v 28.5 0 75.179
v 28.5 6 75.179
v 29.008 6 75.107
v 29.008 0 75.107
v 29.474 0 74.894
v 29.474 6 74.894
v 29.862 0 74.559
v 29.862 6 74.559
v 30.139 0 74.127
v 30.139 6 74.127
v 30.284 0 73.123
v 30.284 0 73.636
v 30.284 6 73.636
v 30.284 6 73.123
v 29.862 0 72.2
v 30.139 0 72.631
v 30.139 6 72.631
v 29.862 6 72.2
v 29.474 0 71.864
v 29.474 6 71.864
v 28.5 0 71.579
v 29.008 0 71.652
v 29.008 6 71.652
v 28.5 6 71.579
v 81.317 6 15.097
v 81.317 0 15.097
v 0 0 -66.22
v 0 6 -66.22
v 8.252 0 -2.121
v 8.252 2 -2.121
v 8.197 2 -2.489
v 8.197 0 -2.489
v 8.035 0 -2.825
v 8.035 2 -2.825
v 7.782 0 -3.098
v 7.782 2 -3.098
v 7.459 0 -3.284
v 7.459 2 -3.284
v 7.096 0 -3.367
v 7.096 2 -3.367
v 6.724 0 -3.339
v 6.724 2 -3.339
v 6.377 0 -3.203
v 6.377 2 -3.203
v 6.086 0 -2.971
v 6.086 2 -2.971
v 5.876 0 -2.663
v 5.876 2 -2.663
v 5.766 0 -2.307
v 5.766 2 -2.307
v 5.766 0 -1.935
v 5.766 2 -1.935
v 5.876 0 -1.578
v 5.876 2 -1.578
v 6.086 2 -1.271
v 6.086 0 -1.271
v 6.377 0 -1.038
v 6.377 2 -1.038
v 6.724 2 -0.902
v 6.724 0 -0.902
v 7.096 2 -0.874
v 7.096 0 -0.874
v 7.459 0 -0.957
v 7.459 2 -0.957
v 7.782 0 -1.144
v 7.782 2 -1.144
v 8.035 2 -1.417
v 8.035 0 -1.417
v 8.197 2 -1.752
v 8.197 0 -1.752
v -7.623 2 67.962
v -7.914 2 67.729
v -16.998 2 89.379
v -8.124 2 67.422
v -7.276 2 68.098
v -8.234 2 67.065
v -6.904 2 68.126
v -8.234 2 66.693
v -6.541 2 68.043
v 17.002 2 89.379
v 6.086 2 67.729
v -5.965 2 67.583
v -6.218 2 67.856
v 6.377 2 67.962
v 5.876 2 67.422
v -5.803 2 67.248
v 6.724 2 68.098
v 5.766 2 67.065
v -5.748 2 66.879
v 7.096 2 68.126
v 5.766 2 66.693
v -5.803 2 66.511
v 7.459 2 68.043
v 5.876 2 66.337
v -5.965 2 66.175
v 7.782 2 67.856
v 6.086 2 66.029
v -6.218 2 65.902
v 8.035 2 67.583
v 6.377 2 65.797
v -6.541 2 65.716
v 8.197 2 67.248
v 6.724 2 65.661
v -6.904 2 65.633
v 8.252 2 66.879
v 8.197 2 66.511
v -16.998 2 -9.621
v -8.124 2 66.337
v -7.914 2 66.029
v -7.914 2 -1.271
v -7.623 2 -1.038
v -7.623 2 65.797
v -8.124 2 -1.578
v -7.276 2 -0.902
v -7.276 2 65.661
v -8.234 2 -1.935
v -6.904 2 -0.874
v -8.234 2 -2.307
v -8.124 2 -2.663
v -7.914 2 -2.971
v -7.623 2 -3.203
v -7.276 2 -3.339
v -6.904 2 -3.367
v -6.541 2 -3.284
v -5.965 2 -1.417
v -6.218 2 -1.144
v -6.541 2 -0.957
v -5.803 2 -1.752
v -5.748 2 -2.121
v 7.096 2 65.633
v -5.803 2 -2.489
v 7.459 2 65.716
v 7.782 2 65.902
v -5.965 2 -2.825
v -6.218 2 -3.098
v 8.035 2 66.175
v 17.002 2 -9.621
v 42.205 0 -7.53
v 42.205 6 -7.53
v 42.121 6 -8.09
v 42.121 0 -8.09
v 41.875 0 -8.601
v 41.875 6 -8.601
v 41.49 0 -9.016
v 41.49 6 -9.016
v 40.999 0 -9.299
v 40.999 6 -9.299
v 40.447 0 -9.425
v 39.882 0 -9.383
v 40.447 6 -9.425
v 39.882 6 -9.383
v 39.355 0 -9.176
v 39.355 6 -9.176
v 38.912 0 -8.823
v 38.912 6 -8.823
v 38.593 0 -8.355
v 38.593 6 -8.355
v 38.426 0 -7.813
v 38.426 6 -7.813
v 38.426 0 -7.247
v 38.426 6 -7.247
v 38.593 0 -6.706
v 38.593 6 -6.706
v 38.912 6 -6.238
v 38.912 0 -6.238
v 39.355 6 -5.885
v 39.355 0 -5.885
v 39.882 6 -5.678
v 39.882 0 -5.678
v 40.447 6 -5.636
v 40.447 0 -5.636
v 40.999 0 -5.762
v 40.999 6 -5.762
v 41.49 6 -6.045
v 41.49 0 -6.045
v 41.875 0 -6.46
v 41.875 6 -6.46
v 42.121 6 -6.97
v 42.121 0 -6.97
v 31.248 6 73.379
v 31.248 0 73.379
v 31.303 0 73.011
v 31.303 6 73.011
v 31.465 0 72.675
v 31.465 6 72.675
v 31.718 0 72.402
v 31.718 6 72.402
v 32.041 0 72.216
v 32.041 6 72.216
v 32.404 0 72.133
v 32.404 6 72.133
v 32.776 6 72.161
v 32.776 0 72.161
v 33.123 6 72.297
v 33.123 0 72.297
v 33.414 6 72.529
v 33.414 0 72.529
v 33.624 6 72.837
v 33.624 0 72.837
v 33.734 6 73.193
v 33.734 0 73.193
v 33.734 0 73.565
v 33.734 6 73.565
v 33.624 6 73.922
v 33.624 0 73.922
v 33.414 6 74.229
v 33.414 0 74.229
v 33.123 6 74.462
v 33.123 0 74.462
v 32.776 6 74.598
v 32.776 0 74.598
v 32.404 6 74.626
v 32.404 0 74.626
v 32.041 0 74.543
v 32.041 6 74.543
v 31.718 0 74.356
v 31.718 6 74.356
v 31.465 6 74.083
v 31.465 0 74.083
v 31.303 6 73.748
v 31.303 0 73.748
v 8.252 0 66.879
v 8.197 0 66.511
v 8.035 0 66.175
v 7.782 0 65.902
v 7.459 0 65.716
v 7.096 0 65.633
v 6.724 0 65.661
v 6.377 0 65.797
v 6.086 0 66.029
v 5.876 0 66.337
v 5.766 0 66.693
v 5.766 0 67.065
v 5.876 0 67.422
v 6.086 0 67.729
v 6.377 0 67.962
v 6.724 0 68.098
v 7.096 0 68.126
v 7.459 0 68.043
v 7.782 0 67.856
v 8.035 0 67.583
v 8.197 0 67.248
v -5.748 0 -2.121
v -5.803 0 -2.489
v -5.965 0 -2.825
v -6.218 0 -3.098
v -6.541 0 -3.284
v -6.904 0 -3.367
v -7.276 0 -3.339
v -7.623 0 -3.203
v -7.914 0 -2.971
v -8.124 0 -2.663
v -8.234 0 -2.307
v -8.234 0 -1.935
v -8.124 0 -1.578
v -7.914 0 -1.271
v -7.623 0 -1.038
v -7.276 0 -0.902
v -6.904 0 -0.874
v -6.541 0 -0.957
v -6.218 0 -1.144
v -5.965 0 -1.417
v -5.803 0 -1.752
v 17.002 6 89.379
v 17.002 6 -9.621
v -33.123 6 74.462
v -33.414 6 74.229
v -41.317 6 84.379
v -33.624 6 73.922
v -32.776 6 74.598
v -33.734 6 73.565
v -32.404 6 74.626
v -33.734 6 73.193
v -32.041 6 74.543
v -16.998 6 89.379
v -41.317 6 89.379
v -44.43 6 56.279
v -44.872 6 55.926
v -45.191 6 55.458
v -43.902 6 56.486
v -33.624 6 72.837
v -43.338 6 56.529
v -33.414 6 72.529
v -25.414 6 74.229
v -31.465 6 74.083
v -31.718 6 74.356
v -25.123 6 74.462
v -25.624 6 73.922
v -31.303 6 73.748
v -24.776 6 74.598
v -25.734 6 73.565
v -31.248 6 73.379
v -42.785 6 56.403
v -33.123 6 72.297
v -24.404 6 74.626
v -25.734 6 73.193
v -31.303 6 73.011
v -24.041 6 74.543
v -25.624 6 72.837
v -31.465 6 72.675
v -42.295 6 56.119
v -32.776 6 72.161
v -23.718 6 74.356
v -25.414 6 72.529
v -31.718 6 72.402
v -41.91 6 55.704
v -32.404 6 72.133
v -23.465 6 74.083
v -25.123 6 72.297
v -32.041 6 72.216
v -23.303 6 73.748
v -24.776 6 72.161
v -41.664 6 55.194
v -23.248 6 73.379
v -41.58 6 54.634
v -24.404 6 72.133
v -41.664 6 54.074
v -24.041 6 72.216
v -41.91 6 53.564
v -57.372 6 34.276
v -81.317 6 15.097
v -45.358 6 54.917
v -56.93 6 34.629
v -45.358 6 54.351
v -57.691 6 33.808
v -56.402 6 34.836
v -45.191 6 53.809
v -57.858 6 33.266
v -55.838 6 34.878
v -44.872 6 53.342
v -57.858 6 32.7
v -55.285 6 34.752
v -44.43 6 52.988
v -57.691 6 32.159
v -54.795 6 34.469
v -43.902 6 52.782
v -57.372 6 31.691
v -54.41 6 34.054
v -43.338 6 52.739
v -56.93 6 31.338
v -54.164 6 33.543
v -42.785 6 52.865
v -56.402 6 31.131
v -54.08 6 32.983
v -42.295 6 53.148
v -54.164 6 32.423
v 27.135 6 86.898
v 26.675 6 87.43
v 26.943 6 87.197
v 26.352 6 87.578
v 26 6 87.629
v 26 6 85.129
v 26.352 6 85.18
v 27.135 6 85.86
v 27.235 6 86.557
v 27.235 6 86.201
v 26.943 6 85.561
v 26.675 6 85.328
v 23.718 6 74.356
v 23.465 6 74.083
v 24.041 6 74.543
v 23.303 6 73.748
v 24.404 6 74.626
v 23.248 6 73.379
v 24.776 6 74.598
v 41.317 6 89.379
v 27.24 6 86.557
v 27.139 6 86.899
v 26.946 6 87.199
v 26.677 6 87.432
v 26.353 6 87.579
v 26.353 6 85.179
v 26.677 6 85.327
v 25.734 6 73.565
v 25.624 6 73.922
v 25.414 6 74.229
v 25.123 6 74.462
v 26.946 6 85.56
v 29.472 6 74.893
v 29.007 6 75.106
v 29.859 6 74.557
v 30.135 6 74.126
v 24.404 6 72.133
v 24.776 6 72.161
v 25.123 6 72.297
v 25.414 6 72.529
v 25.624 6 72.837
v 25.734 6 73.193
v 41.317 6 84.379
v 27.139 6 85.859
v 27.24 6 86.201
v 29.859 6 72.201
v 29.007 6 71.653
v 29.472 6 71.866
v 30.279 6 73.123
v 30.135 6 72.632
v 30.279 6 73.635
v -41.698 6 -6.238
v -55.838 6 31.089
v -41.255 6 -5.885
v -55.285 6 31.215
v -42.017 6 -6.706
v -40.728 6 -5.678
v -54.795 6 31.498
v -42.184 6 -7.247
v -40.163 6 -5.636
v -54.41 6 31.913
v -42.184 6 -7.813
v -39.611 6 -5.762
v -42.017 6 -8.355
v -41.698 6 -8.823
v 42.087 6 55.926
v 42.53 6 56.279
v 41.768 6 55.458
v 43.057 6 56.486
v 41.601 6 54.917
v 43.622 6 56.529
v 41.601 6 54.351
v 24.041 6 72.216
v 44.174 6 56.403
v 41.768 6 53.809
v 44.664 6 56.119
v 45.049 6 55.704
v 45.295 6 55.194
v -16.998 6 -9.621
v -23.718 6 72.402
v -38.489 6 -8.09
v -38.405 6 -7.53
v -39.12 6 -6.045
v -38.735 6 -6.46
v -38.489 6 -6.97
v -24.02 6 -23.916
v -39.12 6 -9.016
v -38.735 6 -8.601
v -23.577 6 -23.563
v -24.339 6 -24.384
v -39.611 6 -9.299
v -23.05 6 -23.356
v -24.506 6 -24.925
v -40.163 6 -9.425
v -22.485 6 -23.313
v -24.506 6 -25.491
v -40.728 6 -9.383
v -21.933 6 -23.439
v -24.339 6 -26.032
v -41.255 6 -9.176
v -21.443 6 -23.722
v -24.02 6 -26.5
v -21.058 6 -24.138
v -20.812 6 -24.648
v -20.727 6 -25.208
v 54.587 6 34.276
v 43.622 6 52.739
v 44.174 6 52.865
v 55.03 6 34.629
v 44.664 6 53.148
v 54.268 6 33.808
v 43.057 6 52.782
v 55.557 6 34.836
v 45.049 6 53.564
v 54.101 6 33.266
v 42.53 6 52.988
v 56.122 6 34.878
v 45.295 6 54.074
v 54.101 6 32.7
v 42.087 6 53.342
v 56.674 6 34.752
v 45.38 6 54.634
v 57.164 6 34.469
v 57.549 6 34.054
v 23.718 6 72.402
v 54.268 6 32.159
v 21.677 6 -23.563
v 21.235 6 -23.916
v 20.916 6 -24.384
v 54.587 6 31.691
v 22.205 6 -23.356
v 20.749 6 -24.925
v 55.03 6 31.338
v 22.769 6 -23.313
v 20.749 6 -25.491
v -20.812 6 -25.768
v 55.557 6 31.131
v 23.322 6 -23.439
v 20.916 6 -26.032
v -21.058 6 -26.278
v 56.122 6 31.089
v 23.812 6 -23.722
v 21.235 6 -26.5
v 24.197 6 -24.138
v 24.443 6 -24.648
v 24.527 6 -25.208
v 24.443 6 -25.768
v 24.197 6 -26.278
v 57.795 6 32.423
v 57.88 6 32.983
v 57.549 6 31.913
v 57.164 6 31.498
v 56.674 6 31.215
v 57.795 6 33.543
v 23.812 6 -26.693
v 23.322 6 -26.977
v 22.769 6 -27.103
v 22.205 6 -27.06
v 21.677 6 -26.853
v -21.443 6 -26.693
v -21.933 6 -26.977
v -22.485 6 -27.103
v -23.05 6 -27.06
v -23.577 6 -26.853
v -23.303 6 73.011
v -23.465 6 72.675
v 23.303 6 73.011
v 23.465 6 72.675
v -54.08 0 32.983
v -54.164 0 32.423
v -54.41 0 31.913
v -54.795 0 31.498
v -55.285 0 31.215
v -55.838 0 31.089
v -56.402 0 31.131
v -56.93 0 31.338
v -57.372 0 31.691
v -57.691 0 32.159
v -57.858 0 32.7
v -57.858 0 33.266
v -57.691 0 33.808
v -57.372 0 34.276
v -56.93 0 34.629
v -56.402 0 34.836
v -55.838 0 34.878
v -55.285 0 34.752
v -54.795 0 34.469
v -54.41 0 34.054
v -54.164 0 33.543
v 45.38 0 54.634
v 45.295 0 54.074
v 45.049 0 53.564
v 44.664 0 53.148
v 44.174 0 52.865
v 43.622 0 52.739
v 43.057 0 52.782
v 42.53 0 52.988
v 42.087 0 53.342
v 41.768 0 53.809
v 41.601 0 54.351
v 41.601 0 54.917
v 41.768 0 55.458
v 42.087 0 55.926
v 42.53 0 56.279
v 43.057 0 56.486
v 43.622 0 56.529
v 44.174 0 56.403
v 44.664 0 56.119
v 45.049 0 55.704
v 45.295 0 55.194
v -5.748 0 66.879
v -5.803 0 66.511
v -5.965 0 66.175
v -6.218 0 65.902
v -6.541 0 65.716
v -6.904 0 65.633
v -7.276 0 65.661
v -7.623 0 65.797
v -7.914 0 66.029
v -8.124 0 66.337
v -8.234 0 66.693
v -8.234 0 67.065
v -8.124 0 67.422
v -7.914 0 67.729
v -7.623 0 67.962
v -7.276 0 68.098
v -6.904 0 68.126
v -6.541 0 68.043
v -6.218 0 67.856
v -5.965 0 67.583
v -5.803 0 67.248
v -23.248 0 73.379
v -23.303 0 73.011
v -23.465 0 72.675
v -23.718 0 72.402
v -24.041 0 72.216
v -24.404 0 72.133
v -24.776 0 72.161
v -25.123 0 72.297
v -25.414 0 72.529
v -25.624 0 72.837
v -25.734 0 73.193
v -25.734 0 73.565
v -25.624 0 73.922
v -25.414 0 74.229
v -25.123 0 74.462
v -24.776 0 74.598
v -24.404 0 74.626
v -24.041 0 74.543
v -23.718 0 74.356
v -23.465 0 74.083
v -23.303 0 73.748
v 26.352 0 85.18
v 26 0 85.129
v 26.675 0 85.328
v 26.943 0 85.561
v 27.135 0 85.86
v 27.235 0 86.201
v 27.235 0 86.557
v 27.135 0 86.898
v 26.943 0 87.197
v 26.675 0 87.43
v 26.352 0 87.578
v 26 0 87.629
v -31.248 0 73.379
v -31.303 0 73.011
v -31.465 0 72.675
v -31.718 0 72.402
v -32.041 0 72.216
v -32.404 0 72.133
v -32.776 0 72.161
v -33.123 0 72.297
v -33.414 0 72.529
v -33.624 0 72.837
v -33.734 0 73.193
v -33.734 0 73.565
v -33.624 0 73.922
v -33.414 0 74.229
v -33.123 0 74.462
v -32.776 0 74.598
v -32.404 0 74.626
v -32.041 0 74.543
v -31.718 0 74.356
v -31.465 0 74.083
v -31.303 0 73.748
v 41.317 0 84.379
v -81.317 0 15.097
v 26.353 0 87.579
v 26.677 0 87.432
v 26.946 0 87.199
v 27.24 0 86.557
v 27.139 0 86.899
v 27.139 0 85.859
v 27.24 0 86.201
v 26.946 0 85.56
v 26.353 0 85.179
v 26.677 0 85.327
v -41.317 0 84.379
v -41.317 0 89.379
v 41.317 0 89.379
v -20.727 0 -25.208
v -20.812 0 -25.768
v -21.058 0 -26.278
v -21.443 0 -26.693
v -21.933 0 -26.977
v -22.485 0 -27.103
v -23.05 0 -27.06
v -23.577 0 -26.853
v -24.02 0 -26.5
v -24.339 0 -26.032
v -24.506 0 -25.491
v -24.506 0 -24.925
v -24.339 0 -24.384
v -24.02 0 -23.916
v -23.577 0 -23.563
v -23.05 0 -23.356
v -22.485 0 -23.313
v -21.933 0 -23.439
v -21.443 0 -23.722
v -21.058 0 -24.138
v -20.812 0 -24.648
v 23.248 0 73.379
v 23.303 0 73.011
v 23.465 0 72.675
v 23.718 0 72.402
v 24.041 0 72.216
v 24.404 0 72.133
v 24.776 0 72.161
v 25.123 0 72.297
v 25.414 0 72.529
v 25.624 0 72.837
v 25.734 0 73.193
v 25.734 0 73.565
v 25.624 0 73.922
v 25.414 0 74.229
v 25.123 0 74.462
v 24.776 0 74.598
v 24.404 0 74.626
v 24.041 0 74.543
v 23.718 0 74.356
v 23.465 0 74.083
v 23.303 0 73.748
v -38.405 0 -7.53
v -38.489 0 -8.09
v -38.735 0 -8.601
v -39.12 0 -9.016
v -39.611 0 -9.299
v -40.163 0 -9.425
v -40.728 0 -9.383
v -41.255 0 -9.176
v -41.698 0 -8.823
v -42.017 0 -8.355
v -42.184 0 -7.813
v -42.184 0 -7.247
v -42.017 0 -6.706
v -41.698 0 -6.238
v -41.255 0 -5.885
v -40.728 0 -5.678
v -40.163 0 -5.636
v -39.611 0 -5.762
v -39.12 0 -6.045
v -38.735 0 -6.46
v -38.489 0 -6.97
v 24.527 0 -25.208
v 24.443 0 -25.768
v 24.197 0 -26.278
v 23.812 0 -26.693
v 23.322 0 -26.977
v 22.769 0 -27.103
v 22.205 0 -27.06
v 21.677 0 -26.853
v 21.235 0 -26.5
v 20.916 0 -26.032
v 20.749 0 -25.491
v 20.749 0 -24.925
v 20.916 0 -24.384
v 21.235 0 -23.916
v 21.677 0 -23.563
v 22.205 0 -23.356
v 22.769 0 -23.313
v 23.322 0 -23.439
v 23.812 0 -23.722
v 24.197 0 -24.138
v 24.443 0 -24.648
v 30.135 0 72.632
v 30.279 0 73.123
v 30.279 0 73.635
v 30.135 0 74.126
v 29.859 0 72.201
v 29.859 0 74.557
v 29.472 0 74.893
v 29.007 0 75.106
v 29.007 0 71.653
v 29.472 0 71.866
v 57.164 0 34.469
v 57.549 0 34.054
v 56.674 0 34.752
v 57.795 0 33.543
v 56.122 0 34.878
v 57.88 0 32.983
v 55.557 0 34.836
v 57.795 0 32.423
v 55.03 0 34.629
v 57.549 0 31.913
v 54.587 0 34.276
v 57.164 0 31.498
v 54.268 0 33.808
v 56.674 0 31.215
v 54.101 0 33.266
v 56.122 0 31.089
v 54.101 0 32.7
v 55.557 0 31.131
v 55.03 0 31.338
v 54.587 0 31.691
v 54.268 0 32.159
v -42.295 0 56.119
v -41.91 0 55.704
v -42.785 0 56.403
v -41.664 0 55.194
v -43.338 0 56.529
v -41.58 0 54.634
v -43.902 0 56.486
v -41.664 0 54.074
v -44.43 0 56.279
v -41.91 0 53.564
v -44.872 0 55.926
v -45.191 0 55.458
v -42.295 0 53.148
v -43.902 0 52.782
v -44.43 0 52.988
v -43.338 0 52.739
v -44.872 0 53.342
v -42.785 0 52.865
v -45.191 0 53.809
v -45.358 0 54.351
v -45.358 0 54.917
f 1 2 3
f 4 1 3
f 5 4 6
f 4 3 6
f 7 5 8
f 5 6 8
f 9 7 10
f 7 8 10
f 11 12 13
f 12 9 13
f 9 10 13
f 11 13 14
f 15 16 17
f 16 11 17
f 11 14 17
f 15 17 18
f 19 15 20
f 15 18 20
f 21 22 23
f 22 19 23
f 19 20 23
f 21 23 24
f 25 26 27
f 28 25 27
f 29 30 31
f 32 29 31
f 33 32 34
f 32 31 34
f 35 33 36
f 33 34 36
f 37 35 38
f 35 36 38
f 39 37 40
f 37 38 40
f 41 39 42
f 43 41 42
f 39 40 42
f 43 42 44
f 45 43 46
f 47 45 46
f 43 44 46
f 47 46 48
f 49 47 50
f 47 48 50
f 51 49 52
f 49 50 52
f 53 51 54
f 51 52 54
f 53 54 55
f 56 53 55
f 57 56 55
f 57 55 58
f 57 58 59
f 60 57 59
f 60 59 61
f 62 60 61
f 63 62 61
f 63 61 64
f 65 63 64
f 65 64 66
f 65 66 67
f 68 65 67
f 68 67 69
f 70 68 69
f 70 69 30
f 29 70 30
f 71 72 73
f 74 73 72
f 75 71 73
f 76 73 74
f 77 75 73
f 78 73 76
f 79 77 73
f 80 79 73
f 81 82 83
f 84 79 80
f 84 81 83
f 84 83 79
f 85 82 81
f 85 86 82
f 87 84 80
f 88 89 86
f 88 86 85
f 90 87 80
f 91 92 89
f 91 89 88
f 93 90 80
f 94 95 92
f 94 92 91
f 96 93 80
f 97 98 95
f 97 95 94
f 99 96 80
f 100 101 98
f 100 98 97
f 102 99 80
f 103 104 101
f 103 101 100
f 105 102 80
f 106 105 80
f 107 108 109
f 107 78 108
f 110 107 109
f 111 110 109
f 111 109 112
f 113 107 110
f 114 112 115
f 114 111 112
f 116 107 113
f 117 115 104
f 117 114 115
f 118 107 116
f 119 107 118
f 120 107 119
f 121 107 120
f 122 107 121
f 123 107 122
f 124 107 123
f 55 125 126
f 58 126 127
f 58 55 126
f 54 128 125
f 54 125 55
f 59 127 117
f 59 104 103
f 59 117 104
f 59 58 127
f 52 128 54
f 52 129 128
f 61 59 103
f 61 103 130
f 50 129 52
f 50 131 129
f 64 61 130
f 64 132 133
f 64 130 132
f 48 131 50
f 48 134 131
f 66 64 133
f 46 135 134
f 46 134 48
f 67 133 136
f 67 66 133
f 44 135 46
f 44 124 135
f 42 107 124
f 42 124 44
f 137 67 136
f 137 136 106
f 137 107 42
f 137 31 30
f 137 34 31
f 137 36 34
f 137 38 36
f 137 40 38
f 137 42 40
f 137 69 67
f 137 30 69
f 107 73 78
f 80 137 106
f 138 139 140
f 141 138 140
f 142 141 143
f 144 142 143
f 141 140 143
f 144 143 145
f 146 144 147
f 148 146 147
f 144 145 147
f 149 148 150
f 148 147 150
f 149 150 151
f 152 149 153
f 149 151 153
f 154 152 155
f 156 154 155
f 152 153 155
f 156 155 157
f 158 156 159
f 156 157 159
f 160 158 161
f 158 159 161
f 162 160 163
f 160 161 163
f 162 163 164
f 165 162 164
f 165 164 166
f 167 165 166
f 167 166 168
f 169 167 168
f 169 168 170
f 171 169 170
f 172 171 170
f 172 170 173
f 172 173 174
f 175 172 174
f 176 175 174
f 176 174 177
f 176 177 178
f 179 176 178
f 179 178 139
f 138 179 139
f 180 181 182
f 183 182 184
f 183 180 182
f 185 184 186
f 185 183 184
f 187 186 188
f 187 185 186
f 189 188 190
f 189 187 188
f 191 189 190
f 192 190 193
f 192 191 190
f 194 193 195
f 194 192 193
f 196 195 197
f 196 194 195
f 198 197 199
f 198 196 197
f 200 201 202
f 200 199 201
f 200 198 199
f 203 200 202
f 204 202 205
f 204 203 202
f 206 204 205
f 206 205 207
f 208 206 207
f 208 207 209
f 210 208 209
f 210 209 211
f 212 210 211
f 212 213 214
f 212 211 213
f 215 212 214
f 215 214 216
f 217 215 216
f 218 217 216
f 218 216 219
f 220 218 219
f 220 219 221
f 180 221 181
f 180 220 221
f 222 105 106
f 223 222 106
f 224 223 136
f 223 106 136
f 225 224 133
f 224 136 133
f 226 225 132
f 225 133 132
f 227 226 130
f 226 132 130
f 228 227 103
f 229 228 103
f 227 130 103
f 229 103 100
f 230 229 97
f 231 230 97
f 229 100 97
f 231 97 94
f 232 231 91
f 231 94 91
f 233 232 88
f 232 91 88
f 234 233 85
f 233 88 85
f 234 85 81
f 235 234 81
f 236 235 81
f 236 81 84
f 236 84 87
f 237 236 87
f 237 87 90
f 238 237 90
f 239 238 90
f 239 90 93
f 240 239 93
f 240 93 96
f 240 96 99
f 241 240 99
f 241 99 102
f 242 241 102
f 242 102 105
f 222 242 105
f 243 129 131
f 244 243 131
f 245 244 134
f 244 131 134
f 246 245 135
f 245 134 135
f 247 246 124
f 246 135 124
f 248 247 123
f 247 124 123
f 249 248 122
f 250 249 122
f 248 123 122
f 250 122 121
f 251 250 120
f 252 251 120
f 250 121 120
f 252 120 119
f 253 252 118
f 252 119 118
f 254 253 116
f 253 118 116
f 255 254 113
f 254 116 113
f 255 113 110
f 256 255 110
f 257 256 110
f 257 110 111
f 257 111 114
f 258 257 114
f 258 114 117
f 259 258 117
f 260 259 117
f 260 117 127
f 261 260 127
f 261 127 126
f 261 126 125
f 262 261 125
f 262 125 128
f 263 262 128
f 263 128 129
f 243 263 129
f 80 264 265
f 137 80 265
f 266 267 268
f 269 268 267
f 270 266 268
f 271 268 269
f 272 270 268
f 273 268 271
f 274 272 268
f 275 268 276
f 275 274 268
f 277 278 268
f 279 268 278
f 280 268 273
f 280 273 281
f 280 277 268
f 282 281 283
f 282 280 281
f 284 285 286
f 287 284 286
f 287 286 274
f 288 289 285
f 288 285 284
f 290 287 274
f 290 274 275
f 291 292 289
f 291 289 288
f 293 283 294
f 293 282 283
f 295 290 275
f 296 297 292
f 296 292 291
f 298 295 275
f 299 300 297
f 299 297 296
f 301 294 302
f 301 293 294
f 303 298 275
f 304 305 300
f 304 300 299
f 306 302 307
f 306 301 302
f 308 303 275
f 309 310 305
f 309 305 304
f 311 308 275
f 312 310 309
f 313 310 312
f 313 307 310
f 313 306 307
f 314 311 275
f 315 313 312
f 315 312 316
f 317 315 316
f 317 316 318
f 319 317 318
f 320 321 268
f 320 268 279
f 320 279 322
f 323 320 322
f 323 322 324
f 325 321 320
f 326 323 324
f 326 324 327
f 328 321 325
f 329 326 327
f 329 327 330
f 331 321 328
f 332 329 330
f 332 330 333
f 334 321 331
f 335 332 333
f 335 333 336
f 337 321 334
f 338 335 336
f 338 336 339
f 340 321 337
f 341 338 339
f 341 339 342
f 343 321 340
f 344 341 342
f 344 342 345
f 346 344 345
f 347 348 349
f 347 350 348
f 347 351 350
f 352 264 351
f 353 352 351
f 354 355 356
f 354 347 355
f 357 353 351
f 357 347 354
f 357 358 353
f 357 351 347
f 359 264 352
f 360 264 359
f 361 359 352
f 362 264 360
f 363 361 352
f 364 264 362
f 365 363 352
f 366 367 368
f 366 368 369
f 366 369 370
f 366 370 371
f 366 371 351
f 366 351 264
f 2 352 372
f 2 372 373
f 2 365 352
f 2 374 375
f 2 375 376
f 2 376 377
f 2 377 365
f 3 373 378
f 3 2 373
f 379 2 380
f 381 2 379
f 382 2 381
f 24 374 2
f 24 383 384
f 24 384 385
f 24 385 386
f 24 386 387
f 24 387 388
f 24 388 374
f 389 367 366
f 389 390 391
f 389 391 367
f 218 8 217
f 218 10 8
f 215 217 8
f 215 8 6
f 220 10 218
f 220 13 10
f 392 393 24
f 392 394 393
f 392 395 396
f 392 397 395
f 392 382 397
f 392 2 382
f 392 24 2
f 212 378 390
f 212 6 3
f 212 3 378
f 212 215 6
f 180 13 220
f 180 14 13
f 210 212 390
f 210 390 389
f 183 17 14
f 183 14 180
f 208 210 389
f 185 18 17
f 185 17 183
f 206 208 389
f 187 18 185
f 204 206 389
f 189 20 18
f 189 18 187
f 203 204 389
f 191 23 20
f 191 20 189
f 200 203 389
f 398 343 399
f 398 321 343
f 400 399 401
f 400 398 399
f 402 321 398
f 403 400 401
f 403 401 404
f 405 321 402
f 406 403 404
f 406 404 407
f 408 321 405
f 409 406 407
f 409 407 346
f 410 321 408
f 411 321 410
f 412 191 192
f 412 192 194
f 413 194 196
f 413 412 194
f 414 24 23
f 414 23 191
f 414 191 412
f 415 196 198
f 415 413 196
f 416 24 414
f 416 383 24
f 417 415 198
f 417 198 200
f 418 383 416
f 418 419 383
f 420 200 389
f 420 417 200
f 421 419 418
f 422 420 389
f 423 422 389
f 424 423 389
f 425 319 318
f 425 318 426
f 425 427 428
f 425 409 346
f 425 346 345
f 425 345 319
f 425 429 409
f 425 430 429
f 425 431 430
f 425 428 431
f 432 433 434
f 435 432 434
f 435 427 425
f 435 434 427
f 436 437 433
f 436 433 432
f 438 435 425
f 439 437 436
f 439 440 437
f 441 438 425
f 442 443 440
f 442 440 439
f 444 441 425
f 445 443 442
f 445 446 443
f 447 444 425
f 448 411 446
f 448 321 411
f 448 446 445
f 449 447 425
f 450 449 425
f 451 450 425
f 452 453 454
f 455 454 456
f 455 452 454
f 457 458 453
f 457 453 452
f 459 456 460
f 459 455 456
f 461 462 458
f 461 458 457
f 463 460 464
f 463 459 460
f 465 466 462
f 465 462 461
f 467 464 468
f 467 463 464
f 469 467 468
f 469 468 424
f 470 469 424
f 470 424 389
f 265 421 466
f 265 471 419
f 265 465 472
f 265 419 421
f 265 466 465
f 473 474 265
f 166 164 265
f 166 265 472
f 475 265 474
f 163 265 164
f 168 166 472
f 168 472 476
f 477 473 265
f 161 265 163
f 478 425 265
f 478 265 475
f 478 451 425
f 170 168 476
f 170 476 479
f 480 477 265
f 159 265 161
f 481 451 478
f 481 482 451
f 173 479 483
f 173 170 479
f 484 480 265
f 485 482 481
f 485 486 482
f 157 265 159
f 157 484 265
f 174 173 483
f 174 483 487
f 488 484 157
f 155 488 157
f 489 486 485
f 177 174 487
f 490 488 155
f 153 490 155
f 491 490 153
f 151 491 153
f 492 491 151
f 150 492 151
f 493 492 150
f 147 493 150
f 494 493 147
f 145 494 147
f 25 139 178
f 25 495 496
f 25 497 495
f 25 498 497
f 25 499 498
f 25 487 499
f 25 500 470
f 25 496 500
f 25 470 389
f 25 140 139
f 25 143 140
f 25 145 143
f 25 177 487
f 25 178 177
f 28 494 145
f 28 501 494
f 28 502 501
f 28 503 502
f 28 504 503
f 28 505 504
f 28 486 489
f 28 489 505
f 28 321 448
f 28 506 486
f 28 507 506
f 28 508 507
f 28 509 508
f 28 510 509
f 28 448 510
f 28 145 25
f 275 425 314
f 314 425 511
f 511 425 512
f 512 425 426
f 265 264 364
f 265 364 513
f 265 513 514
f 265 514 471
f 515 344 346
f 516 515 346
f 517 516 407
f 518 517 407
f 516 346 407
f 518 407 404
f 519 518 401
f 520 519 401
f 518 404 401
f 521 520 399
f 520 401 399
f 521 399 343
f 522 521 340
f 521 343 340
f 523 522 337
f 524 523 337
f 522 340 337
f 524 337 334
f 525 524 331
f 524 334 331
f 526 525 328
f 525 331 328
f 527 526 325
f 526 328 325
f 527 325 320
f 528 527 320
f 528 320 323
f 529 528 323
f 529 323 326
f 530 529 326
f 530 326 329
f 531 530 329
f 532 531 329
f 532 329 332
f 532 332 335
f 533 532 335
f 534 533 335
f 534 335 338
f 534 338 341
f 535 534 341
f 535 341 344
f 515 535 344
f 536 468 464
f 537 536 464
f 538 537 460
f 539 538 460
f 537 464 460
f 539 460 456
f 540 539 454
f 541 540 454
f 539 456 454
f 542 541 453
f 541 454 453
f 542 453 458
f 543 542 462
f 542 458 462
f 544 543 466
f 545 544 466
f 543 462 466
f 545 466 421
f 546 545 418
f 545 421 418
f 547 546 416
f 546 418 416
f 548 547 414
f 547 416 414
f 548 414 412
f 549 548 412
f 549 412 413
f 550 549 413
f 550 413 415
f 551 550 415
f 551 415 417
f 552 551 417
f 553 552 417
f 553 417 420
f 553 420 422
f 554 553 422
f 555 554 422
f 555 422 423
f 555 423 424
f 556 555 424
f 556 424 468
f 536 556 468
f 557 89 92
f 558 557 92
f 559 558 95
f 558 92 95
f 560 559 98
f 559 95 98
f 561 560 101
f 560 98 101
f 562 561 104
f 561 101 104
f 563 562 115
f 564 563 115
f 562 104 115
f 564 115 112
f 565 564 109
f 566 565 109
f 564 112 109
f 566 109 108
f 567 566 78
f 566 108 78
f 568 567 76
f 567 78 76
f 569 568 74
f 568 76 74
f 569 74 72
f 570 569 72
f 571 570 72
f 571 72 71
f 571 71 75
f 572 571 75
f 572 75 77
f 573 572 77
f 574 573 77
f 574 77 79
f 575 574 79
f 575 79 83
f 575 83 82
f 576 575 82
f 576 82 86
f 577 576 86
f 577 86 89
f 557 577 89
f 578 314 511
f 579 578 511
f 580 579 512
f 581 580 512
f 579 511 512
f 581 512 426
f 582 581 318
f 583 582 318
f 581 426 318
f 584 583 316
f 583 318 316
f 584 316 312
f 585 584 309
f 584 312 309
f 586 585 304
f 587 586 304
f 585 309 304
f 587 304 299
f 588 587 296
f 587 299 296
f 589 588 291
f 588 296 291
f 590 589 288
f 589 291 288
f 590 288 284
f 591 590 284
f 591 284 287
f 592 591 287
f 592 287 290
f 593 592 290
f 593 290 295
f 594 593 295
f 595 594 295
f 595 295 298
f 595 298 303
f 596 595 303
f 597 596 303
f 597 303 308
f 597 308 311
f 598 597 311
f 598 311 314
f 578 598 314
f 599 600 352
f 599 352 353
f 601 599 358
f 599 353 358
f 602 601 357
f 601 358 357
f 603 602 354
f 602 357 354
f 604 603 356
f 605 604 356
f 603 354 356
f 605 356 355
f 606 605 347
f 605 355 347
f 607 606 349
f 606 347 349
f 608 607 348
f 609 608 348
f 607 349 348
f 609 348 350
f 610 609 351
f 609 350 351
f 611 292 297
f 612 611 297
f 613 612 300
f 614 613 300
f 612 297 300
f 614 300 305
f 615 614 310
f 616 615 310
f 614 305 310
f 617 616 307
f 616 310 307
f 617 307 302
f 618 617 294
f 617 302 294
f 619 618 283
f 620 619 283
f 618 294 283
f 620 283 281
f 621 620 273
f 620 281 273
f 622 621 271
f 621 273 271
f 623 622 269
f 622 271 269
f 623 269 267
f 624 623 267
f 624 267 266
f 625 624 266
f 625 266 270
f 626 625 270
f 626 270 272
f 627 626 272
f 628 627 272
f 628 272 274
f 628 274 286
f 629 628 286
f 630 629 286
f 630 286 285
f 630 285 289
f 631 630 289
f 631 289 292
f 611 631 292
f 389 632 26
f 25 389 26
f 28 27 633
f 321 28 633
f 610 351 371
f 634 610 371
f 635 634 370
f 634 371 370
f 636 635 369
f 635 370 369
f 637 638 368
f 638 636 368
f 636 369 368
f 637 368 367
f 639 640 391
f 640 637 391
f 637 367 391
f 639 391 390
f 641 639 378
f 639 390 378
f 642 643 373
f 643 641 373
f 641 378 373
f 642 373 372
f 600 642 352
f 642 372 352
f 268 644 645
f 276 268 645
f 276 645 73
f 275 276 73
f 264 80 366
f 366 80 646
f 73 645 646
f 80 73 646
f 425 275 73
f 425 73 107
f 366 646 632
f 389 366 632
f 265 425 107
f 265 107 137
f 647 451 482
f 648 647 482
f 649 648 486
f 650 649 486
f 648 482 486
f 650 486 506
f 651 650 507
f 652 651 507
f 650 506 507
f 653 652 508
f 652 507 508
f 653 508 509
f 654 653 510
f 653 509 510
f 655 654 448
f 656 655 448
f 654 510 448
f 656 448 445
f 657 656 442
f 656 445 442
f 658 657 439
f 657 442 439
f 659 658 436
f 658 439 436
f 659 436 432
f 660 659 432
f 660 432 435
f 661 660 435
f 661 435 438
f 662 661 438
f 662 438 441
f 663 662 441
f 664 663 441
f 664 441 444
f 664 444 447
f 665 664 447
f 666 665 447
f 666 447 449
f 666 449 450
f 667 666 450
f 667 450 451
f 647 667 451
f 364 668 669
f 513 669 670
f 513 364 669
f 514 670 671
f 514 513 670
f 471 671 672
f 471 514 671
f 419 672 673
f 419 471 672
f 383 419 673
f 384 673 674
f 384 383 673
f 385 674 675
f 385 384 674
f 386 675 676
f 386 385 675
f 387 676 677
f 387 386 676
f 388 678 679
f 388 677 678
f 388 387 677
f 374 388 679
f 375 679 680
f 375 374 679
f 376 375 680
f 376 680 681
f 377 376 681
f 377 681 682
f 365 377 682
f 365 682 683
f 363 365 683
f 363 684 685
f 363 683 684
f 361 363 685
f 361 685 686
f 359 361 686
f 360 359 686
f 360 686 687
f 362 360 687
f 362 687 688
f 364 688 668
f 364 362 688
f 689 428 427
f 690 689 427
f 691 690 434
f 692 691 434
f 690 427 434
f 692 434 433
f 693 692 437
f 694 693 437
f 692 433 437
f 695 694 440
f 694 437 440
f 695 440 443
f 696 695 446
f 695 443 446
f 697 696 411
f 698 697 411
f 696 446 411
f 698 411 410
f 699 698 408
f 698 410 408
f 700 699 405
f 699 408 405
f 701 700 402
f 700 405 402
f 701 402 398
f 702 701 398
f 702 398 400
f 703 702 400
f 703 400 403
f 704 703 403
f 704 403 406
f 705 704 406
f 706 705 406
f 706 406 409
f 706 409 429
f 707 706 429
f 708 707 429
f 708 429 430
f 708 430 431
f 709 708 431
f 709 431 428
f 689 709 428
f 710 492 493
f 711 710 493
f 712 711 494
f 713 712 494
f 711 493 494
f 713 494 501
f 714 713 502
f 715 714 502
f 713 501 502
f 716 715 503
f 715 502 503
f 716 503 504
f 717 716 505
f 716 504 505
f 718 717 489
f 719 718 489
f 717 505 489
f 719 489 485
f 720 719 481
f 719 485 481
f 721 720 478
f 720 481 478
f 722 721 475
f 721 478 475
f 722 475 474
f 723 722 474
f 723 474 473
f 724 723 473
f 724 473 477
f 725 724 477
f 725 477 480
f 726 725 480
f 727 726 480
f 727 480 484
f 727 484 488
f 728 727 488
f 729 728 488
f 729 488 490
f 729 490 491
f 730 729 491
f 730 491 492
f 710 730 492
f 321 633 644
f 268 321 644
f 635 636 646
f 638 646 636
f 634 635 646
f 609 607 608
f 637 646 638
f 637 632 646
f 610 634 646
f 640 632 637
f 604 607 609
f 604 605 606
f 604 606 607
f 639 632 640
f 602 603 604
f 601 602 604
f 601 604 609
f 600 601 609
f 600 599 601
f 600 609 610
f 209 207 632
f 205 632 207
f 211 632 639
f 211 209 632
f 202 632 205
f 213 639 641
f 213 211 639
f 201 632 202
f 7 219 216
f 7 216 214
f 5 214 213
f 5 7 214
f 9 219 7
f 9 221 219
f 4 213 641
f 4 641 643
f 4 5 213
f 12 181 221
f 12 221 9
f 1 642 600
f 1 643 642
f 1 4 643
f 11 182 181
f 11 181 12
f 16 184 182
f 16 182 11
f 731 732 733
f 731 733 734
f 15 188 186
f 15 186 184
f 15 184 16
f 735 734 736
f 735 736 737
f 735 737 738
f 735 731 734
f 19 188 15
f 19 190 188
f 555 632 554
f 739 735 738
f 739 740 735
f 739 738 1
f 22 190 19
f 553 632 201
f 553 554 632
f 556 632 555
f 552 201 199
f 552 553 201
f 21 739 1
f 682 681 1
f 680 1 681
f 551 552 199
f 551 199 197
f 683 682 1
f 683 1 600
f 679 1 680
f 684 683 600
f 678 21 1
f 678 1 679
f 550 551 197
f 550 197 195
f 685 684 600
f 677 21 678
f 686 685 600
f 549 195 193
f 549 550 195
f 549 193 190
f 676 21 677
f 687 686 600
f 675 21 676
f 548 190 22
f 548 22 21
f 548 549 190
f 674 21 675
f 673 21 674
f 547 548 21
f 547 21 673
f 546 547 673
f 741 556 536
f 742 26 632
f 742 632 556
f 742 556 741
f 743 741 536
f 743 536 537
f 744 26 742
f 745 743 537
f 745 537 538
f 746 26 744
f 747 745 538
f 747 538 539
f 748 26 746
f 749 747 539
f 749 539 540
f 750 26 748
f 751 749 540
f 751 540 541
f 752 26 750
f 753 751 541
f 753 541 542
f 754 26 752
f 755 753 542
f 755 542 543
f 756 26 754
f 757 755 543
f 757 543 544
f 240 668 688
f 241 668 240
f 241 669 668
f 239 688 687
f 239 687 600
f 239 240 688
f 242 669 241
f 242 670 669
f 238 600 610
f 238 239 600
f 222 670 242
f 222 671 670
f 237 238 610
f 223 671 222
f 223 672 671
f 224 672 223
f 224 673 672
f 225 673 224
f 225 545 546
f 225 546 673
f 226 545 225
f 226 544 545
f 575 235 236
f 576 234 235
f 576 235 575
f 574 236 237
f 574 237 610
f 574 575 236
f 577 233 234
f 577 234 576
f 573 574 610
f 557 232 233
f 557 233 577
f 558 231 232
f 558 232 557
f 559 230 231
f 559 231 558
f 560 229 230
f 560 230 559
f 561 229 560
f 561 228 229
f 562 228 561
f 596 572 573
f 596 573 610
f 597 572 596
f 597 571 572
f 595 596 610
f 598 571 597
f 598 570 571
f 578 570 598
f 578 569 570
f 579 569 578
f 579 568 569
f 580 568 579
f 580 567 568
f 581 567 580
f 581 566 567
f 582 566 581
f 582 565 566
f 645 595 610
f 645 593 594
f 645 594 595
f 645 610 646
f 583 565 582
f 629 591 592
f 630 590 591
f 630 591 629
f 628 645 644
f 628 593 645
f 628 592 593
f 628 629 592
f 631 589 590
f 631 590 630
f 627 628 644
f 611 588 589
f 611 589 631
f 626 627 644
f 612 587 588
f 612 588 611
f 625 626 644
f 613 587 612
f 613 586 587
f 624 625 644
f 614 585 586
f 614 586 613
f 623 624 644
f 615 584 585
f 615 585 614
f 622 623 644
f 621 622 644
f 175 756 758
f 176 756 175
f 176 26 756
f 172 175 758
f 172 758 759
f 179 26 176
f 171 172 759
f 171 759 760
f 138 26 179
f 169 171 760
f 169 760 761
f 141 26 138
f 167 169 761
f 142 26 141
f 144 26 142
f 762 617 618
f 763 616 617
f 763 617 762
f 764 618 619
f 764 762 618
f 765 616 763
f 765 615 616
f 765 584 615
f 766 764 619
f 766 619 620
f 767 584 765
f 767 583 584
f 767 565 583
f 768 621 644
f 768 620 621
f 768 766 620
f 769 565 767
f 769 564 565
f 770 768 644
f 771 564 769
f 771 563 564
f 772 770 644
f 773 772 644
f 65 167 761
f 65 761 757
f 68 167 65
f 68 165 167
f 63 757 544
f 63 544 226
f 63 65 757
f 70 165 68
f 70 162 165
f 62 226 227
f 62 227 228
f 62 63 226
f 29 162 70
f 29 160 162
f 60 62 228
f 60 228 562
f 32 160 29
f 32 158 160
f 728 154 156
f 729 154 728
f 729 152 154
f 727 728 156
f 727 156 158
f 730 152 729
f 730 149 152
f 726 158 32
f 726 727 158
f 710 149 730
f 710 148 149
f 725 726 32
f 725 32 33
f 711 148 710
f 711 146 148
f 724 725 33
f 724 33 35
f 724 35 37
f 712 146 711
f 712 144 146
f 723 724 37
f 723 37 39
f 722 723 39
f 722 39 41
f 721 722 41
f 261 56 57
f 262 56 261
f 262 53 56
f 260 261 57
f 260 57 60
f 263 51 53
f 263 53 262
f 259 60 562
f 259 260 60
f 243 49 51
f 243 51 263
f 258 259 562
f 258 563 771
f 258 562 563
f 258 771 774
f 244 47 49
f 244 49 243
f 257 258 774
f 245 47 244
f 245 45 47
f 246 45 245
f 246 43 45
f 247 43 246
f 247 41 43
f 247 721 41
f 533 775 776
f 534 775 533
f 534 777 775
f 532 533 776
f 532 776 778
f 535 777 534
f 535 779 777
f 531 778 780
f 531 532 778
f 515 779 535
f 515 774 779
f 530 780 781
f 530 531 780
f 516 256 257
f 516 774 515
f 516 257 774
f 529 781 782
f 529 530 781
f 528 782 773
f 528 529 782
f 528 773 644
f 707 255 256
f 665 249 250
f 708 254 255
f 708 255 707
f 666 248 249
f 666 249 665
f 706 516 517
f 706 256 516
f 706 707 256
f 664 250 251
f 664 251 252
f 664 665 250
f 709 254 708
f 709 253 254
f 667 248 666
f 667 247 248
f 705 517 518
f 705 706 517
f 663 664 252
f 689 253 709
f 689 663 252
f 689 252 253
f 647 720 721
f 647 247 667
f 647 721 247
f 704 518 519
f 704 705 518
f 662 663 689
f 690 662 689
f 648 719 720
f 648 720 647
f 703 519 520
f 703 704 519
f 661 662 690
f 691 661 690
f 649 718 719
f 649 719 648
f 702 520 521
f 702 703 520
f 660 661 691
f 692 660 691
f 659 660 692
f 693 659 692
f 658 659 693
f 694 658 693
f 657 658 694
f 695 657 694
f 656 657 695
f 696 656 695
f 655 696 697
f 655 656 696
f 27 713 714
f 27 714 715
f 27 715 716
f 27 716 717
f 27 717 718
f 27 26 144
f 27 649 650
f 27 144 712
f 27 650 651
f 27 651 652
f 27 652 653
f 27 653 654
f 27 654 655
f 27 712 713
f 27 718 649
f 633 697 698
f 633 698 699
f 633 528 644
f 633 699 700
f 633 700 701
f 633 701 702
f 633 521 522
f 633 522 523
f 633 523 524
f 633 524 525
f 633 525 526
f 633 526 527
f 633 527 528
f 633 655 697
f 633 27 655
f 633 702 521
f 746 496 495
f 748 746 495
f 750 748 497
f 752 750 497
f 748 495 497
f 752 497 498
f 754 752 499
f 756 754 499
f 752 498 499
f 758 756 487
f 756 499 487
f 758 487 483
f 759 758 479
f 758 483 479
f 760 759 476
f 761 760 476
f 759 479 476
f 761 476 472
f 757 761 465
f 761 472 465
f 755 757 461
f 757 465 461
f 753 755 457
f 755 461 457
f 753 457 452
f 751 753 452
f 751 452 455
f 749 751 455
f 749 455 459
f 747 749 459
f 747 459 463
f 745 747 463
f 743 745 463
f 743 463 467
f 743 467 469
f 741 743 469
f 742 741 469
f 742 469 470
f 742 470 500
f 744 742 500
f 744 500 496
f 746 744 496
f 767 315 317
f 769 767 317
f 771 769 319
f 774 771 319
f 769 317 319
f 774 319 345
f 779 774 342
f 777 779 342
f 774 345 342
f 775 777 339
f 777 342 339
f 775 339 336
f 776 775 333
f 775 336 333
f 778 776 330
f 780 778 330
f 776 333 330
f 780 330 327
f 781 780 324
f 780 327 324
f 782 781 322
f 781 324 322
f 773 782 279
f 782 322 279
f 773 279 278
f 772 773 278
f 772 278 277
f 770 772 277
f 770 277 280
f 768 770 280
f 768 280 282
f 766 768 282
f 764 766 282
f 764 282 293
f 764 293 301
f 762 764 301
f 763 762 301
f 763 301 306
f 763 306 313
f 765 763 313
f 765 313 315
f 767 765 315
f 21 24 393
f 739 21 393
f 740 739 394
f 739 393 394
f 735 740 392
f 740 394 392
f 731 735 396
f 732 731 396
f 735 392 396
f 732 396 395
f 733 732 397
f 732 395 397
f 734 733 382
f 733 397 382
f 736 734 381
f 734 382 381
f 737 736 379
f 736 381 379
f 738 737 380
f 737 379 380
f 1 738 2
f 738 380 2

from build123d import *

# Parameters (mm, degrees)
BOSS_EXTRUDE1_DEPTH = 6
SKETCH2_W           = 34
SKETCH2_H           = 99
CUT_EXTRUDE1_DEPTH  = 4
SKETCH4_R           = 1.9
CUT_EXTRUDE2_DEPTH  = 7
SKETCH5_R           = 1.8
SKETCH5_R_2         = 1.25
CUT_EXTRUDE3_DEPTH  = 10
SKETCH6_R           = 1.25
CUT_EXTRUDE4_DEPTH  = 10
SKETCH7_R           = 1.25
CUT_EXTRUDE5_DEPTH  = 10
SKETCH8_R           = 1.8
SKETCH8_R_2         = 1.25
BOSS_EXTRUDE2_DEPTH = 6


with BuildPart() as part:
    # Sketch1 → Boss-Extrude1 (new body)
    with BuildSketch(Plane(origin=(0, 0, 0), x_dir=(1, 0, 0), z_dir=(0, 1, 0))):
        Polygon((-41.317279836, -84.379169784), (-41.317279836, -89.379169784), (41.317279836, -89.379169784), (41.317279836, -84.379169784), (81.317279836, -15.097137481), (0, 66.220142355), (-81.317279836, -15.097137481), align=None)
    extrude(amount=BOSS_EXTRUDE1_DEPTH)

    # Sketch2 → Cut-Extrude1 (cut)
    with BuildSketch(Plane(origin=(0, 6, 0), x_dir=(1, 0, 0), z_dir=(0, 1, 0))):
        with Locations((0.002279836, -39.879169784)):
            Rectangle(SKETCH2_W, SKETCH2_H)
    extrude(amount=-CUT_EXTRUDE1_DEPTH, mode=Mode.SUBTRACT)

    # Sketch4 → Cut-Extrude2 (cut, through all)
    with BuildSketch(Plane(origin=(0, 6, 0), x_dir=(1, 0, 0), z_dir=(0, 1, 0))):
        with Locations((-22.627416998, 25.207949047)):
            Circle(SKETCH4_R)
        with Locations((-40.305086528, 7.530279517)):
            Circle(SKETCH4_R)
        with Locations((-55.979629628, -32.983234986)):
            Circle(SKETCH4_R)
        with Locations((-43.479629628, -54.633870081)):
            Circle(SKETCH4_R)
        with Locations((43.479629628, -54.633870081)):
            Circle(SKETCH4_R)
        with Locations((55.979629628, -32.983234986)):
            Circle(SKETCH4_R)
        with Locations((22.627416998, 25.207949047)):
            Circle(SKETCH4_R)
        with Locations((40.305086528, 7.530279517)):
            Circle(SKETCH4_R)
    extrude(amount=-CUT_EXTRUDE2_DEPTH, mode=Mode.SUBTRACT)

    # Sketch5 → Cut-Extrude3 (cut)
    with BuildSketch(Plane(origin=(0, 6, 0), x_dir=(1, 0, 0), z_dir=(0, 1, 0))):
        with Locations((-28.497720164, -73.379169784)):
            Circle(SKETCH5_R)
        with Locations((28.502279836, -73.379169784)):
            Circle(SKETCH5_R)
        with Locations((26.002279836, -86.379169784)):
            Circle(SKETCH5_R_2)
        with Locations((-25.997720164, -86.379169784)):
            Circle(SKETCH5_R_2)
    extrude(amount=-CUT_EXTRUDE3_DEPTH, mode=Mode.SUBTRACT)

    # Sketch6 → Cut-Extrude4 (cut)
    with BuildSketch(Plane(origin=(0, 2, 0), x_dir=(1, 0, 0), z_dir=(0, 1, 0))):
        with Locations((7.002279836, 2.120830216)):
            Circle(SKETCH6_R)
        with Locations((-6.997720164, 2.120830216)):
            Circle(SKETCH6_R)
        with Locations((-6.997720164, -66.879169784)):
            Circle(SKETCH6_R)
        with Locations((7.002279836, -66.879169784)):
            Circle(SKETCH6_R)
    extrude(amount=-CUT_EXTRUDE4_DEPTH, mode=Mode.SUBTRACT)

    # Sketch7 → Cut-Extrude5 (cut)
    with BuildSketch(Plane(origin=(0, 6, 0), x_dir=(1, 0, 0), z_dir=(0, 1, 0))):
        with Locations((-32.497720164, -73.379169784)):
            Circle(SKETCH7_R)
        with Locations((-24.497720164, -73.379169784)):
            Circle(SKETCH7_R)
    cut_extrude5 = extrude(amount=-CUT_EXTRUDE5_DEPTH, mode=Mode.SUBTRACT)

    # Mirror1: Cut-Extrude5 across plane
    add(cut_extrude5.mirror(Plane(origin=(0, 0, 0), x_dir=(0, 0, 1), z_dir=(1, 0, 0))), mode=Mode.SUBTRACT)

    # Sketch8 → Boss-Extrude2 (add)
    with BuildSketch(Plane(origin=(0, 6, 0), x_dir=(1, 0, 0), z_dir=(0, 1, 0))):
        with Locations((-28.497720164, -73.379169784)):
            Circle(SKETCH8_R)
        with Locations((-25.997720164, -86.379169784)):
            Circle(SKETCH8_R_2)
    boss_extrude2 = extrude(amount=-BOSS_EXTRUDE2_DEPTH)

    # Mirror2: Boss-Extrude2 across plane
    add(boss_extrude2.mirror(Plane(origin=(0, 0, 0), x_dir=(0, 0, 1), z_dir=(1, 0, 0))))


solid = part.part
